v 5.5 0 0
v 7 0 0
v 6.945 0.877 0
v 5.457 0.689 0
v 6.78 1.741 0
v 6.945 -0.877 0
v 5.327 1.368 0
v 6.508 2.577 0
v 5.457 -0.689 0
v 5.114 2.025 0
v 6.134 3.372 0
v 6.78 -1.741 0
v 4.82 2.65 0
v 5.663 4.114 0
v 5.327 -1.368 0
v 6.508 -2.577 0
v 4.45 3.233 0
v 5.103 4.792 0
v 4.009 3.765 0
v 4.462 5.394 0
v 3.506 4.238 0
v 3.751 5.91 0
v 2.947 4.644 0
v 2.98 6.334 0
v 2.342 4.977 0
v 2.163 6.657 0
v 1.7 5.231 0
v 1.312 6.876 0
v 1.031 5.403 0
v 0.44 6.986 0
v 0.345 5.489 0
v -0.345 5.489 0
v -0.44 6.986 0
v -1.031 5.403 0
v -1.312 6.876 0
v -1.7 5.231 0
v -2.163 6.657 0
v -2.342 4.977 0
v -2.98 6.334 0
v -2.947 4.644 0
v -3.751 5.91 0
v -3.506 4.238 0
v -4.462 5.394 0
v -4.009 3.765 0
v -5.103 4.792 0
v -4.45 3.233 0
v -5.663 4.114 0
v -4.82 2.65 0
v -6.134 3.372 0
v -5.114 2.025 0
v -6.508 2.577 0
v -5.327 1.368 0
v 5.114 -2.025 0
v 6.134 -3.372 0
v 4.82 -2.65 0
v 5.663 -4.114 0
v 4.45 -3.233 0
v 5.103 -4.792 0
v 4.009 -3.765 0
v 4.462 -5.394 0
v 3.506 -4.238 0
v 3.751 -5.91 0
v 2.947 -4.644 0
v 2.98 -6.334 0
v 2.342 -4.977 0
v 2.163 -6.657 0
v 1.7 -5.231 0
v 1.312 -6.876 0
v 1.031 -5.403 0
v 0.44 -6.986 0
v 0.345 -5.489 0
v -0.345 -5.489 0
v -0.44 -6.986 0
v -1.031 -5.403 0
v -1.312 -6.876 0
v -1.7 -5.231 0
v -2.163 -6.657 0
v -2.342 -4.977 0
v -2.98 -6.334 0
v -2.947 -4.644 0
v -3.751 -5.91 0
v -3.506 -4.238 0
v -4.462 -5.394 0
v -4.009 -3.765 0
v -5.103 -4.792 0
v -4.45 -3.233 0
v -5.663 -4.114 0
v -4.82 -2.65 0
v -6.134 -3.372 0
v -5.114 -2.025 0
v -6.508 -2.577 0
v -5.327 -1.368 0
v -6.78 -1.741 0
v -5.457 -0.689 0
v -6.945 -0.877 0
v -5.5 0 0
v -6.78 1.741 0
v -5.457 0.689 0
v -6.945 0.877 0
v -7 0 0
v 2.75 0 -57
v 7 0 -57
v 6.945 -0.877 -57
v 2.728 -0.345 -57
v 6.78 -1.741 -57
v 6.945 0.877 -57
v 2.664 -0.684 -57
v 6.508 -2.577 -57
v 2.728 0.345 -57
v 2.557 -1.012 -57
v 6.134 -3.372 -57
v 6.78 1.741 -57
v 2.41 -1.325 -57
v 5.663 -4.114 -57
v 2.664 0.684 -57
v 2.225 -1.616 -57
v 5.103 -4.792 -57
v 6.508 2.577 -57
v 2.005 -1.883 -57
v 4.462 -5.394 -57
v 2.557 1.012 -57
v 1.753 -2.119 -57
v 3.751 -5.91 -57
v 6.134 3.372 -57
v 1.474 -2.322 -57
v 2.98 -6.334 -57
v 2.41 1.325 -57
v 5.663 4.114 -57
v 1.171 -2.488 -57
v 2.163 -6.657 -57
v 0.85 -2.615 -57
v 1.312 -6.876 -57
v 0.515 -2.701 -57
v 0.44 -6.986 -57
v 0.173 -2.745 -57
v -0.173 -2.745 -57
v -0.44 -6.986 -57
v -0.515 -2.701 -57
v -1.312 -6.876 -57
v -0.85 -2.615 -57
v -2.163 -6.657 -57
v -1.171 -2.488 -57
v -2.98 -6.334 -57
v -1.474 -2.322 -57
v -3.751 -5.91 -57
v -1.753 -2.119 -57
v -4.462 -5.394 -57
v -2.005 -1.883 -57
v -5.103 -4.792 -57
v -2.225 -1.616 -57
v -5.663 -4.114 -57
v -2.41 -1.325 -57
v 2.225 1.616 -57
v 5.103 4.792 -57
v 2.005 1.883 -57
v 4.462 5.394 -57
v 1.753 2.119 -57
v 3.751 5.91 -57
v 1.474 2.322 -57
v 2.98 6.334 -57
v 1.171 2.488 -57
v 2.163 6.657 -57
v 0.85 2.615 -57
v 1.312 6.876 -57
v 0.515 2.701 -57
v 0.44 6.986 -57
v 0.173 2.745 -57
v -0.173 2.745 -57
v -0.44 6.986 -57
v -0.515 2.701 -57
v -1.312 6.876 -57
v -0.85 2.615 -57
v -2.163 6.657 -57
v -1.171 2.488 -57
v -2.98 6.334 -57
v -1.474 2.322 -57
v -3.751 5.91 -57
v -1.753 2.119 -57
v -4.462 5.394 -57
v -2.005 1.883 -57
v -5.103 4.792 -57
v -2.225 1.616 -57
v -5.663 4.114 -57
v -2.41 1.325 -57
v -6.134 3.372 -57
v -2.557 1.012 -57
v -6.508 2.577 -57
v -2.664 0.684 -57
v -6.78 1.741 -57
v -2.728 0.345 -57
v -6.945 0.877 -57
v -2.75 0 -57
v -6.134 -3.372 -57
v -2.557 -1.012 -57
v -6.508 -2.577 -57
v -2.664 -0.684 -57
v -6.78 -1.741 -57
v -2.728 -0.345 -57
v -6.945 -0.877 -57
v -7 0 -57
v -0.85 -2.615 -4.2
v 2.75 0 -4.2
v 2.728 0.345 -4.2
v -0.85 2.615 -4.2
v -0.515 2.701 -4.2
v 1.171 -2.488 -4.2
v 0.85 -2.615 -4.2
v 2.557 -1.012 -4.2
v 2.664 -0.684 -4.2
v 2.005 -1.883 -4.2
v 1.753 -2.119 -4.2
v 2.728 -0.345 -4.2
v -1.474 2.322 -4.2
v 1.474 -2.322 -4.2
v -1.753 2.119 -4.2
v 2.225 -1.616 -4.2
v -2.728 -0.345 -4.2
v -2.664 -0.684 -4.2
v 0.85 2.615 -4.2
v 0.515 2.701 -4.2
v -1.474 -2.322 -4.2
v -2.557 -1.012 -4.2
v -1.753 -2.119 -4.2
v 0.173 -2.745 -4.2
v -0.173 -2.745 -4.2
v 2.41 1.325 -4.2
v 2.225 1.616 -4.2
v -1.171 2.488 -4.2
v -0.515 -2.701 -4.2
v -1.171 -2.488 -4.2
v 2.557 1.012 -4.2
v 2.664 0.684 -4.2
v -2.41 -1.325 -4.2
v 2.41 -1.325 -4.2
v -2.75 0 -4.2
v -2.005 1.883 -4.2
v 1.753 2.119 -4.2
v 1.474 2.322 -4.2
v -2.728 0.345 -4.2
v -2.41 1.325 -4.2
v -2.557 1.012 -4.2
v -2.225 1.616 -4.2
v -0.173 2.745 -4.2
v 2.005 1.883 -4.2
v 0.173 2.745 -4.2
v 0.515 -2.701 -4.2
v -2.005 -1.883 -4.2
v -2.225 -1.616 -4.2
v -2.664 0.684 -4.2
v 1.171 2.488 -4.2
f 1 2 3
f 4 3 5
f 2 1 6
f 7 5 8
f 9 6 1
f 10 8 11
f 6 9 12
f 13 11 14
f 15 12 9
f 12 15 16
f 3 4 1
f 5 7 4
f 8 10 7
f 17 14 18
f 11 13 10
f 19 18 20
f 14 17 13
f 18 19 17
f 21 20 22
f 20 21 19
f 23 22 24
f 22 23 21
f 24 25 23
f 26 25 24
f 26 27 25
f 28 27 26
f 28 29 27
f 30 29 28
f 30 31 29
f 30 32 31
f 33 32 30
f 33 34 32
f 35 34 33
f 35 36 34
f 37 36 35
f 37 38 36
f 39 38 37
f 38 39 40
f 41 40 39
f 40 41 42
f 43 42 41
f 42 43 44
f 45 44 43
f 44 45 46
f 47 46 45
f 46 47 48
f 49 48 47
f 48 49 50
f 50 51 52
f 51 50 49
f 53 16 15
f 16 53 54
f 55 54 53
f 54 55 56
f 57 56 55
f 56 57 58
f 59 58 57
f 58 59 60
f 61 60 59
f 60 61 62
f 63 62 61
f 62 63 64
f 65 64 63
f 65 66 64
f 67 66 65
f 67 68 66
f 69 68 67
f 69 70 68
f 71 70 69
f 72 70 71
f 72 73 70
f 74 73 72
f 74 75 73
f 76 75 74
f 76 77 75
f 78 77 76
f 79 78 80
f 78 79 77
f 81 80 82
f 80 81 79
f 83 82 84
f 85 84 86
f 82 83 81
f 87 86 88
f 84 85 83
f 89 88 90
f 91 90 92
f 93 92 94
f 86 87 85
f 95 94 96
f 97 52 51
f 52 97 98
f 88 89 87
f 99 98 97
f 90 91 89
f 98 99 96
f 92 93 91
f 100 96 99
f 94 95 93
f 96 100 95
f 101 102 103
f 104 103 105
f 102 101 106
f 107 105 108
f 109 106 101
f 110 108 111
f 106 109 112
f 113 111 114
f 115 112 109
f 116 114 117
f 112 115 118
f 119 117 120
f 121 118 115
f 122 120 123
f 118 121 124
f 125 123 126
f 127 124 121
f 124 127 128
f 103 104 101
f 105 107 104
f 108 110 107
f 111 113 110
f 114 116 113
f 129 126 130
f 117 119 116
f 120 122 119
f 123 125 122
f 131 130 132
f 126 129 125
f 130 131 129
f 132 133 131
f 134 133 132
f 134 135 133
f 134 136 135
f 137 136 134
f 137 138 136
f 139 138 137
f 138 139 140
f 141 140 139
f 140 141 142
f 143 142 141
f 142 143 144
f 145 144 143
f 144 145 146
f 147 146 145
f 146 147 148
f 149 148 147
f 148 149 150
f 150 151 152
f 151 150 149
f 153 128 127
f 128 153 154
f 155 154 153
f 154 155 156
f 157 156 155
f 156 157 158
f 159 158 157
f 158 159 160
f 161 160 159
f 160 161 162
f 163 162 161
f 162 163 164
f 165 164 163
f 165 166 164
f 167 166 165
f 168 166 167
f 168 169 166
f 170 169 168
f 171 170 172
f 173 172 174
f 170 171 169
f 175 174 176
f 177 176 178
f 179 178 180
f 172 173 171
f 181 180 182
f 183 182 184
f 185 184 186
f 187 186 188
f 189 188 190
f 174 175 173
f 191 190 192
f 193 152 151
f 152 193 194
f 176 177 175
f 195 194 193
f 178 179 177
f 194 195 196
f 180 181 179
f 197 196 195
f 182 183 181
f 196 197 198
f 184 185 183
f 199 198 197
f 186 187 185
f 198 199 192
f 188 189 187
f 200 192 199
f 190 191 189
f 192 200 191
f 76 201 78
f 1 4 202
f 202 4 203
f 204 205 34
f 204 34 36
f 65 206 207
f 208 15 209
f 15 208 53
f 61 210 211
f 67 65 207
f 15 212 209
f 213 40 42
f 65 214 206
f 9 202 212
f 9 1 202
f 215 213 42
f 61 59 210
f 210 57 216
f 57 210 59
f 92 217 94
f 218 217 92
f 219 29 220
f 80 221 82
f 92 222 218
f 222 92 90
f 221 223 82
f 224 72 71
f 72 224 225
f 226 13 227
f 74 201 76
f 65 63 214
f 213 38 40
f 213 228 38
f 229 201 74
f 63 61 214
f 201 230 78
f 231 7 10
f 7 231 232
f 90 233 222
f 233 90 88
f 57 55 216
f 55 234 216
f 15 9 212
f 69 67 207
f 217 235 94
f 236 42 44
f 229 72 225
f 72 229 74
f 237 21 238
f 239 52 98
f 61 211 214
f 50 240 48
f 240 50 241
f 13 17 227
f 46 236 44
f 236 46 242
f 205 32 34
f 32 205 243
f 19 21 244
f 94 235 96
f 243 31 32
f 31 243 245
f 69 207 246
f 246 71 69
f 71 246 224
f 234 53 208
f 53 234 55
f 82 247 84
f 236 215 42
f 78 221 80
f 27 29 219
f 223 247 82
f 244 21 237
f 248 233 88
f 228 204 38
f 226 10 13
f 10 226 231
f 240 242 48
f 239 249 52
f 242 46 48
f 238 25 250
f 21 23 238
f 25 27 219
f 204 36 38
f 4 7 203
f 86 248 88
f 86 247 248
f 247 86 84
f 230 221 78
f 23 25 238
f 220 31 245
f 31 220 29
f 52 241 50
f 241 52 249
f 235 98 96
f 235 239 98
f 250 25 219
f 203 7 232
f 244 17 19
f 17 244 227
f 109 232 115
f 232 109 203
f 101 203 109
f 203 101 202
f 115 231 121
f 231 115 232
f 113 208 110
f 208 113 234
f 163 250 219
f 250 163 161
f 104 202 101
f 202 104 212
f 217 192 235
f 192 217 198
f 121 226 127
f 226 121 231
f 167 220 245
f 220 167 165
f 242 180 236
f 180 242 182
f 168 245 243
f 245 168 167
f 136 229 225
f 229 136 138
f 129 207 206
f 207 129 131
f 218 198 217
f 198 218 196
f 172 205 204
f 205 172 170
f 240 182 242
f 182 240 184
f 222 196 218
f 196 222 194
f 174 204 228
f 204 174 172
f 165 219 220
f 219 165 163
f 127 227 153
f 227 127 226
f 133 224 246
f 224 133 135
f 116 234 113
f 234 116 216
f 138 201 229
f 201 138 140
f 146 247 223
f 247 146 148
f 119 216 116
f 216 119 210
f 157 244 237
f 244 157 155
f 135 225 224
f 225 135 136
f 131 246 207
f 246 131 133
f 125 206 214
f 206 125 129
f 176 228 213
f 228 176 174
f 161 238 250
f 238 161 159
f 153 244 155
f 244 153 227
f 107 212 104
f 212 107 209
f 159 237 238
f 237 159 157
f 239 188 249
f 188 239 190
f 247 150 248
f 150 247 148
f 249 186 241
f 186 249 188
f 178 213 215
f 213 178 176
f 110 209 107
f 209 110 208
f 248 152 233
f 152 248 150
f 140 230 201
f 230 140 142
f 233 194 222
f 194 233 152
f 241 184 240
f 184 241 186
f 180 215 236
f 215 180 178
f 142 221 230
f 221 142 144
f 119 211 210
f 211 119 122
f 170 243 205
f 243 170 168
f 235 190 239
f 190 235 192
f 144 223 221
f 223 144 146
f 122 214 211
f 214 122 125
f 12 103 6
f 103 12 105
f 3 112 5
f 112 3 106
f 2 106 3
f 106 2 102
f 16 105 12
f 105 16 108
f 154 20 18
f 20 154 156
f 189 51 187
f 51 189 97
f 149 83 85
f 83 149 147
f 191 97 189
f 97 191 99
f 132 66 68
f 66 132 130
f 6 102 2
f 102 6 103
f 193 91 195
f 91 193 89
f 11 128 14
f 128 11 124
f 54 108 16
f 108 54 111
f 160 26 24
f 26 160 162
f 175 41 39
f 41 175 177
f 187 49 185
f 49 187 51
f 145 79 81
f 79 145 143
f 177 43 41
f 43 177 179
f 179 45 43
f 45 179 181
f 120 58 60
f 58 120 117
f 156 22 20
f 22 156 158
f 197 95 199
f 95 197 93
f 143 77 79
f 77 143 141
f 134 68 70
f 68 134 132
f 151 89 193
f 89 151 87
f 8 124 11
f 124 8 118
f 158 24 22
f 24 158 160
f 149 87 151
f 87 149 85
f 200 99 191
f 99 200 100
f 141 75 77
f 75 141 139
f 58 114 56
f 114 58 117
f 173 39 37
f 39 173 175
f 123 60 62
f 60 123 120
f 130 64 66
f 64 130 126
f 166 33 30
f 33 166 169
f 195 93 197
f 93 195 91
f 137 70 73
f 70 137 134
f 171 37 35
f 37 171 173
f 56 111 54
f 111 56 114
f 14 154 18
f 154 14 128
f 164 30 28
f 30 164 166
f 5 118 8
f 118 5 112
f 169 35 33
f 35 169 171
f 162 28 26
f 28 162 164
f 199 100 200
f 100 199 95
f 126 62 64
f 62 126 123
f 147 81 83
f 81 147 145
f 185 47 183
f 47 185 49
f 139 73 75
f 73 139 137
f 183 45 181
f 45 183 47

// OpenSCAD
$fn = 50;


difference() {
	union() {
		translate(v = [0, 0, -57.0000000000]) {
			cylinder(h = 57, r = 7.0000000000);
		}
		cylinder(h = 0, r = 17.0000000000);
	}
	union() {
		translate(v = [0, 0, 0]) {
			rotate(a = [0, 0, 0]) {
				difference() {
					union() {
						#translate(v = [0, 0, -57.0000000000]) {
							cylinder(h = 57, r = 2.2500000000);
						}
						#translate(v = [0, 0, -4.2000000000]) {
							cylinder(h = 4.2000000000, r1 = 2.7500000000, r2 = 5.5000000000);
						}
						#translate(v = [0, 0, -57.0000000000]) {
							cylinder(h = 57, r = 2.7500000000);
						}
						#translate(v = [0, 0, -57.0000000000]) {
							cylinder(h = 57, r = 2.2500000000);
						}
					}
					union();
				}
			}
		}
	}
}
